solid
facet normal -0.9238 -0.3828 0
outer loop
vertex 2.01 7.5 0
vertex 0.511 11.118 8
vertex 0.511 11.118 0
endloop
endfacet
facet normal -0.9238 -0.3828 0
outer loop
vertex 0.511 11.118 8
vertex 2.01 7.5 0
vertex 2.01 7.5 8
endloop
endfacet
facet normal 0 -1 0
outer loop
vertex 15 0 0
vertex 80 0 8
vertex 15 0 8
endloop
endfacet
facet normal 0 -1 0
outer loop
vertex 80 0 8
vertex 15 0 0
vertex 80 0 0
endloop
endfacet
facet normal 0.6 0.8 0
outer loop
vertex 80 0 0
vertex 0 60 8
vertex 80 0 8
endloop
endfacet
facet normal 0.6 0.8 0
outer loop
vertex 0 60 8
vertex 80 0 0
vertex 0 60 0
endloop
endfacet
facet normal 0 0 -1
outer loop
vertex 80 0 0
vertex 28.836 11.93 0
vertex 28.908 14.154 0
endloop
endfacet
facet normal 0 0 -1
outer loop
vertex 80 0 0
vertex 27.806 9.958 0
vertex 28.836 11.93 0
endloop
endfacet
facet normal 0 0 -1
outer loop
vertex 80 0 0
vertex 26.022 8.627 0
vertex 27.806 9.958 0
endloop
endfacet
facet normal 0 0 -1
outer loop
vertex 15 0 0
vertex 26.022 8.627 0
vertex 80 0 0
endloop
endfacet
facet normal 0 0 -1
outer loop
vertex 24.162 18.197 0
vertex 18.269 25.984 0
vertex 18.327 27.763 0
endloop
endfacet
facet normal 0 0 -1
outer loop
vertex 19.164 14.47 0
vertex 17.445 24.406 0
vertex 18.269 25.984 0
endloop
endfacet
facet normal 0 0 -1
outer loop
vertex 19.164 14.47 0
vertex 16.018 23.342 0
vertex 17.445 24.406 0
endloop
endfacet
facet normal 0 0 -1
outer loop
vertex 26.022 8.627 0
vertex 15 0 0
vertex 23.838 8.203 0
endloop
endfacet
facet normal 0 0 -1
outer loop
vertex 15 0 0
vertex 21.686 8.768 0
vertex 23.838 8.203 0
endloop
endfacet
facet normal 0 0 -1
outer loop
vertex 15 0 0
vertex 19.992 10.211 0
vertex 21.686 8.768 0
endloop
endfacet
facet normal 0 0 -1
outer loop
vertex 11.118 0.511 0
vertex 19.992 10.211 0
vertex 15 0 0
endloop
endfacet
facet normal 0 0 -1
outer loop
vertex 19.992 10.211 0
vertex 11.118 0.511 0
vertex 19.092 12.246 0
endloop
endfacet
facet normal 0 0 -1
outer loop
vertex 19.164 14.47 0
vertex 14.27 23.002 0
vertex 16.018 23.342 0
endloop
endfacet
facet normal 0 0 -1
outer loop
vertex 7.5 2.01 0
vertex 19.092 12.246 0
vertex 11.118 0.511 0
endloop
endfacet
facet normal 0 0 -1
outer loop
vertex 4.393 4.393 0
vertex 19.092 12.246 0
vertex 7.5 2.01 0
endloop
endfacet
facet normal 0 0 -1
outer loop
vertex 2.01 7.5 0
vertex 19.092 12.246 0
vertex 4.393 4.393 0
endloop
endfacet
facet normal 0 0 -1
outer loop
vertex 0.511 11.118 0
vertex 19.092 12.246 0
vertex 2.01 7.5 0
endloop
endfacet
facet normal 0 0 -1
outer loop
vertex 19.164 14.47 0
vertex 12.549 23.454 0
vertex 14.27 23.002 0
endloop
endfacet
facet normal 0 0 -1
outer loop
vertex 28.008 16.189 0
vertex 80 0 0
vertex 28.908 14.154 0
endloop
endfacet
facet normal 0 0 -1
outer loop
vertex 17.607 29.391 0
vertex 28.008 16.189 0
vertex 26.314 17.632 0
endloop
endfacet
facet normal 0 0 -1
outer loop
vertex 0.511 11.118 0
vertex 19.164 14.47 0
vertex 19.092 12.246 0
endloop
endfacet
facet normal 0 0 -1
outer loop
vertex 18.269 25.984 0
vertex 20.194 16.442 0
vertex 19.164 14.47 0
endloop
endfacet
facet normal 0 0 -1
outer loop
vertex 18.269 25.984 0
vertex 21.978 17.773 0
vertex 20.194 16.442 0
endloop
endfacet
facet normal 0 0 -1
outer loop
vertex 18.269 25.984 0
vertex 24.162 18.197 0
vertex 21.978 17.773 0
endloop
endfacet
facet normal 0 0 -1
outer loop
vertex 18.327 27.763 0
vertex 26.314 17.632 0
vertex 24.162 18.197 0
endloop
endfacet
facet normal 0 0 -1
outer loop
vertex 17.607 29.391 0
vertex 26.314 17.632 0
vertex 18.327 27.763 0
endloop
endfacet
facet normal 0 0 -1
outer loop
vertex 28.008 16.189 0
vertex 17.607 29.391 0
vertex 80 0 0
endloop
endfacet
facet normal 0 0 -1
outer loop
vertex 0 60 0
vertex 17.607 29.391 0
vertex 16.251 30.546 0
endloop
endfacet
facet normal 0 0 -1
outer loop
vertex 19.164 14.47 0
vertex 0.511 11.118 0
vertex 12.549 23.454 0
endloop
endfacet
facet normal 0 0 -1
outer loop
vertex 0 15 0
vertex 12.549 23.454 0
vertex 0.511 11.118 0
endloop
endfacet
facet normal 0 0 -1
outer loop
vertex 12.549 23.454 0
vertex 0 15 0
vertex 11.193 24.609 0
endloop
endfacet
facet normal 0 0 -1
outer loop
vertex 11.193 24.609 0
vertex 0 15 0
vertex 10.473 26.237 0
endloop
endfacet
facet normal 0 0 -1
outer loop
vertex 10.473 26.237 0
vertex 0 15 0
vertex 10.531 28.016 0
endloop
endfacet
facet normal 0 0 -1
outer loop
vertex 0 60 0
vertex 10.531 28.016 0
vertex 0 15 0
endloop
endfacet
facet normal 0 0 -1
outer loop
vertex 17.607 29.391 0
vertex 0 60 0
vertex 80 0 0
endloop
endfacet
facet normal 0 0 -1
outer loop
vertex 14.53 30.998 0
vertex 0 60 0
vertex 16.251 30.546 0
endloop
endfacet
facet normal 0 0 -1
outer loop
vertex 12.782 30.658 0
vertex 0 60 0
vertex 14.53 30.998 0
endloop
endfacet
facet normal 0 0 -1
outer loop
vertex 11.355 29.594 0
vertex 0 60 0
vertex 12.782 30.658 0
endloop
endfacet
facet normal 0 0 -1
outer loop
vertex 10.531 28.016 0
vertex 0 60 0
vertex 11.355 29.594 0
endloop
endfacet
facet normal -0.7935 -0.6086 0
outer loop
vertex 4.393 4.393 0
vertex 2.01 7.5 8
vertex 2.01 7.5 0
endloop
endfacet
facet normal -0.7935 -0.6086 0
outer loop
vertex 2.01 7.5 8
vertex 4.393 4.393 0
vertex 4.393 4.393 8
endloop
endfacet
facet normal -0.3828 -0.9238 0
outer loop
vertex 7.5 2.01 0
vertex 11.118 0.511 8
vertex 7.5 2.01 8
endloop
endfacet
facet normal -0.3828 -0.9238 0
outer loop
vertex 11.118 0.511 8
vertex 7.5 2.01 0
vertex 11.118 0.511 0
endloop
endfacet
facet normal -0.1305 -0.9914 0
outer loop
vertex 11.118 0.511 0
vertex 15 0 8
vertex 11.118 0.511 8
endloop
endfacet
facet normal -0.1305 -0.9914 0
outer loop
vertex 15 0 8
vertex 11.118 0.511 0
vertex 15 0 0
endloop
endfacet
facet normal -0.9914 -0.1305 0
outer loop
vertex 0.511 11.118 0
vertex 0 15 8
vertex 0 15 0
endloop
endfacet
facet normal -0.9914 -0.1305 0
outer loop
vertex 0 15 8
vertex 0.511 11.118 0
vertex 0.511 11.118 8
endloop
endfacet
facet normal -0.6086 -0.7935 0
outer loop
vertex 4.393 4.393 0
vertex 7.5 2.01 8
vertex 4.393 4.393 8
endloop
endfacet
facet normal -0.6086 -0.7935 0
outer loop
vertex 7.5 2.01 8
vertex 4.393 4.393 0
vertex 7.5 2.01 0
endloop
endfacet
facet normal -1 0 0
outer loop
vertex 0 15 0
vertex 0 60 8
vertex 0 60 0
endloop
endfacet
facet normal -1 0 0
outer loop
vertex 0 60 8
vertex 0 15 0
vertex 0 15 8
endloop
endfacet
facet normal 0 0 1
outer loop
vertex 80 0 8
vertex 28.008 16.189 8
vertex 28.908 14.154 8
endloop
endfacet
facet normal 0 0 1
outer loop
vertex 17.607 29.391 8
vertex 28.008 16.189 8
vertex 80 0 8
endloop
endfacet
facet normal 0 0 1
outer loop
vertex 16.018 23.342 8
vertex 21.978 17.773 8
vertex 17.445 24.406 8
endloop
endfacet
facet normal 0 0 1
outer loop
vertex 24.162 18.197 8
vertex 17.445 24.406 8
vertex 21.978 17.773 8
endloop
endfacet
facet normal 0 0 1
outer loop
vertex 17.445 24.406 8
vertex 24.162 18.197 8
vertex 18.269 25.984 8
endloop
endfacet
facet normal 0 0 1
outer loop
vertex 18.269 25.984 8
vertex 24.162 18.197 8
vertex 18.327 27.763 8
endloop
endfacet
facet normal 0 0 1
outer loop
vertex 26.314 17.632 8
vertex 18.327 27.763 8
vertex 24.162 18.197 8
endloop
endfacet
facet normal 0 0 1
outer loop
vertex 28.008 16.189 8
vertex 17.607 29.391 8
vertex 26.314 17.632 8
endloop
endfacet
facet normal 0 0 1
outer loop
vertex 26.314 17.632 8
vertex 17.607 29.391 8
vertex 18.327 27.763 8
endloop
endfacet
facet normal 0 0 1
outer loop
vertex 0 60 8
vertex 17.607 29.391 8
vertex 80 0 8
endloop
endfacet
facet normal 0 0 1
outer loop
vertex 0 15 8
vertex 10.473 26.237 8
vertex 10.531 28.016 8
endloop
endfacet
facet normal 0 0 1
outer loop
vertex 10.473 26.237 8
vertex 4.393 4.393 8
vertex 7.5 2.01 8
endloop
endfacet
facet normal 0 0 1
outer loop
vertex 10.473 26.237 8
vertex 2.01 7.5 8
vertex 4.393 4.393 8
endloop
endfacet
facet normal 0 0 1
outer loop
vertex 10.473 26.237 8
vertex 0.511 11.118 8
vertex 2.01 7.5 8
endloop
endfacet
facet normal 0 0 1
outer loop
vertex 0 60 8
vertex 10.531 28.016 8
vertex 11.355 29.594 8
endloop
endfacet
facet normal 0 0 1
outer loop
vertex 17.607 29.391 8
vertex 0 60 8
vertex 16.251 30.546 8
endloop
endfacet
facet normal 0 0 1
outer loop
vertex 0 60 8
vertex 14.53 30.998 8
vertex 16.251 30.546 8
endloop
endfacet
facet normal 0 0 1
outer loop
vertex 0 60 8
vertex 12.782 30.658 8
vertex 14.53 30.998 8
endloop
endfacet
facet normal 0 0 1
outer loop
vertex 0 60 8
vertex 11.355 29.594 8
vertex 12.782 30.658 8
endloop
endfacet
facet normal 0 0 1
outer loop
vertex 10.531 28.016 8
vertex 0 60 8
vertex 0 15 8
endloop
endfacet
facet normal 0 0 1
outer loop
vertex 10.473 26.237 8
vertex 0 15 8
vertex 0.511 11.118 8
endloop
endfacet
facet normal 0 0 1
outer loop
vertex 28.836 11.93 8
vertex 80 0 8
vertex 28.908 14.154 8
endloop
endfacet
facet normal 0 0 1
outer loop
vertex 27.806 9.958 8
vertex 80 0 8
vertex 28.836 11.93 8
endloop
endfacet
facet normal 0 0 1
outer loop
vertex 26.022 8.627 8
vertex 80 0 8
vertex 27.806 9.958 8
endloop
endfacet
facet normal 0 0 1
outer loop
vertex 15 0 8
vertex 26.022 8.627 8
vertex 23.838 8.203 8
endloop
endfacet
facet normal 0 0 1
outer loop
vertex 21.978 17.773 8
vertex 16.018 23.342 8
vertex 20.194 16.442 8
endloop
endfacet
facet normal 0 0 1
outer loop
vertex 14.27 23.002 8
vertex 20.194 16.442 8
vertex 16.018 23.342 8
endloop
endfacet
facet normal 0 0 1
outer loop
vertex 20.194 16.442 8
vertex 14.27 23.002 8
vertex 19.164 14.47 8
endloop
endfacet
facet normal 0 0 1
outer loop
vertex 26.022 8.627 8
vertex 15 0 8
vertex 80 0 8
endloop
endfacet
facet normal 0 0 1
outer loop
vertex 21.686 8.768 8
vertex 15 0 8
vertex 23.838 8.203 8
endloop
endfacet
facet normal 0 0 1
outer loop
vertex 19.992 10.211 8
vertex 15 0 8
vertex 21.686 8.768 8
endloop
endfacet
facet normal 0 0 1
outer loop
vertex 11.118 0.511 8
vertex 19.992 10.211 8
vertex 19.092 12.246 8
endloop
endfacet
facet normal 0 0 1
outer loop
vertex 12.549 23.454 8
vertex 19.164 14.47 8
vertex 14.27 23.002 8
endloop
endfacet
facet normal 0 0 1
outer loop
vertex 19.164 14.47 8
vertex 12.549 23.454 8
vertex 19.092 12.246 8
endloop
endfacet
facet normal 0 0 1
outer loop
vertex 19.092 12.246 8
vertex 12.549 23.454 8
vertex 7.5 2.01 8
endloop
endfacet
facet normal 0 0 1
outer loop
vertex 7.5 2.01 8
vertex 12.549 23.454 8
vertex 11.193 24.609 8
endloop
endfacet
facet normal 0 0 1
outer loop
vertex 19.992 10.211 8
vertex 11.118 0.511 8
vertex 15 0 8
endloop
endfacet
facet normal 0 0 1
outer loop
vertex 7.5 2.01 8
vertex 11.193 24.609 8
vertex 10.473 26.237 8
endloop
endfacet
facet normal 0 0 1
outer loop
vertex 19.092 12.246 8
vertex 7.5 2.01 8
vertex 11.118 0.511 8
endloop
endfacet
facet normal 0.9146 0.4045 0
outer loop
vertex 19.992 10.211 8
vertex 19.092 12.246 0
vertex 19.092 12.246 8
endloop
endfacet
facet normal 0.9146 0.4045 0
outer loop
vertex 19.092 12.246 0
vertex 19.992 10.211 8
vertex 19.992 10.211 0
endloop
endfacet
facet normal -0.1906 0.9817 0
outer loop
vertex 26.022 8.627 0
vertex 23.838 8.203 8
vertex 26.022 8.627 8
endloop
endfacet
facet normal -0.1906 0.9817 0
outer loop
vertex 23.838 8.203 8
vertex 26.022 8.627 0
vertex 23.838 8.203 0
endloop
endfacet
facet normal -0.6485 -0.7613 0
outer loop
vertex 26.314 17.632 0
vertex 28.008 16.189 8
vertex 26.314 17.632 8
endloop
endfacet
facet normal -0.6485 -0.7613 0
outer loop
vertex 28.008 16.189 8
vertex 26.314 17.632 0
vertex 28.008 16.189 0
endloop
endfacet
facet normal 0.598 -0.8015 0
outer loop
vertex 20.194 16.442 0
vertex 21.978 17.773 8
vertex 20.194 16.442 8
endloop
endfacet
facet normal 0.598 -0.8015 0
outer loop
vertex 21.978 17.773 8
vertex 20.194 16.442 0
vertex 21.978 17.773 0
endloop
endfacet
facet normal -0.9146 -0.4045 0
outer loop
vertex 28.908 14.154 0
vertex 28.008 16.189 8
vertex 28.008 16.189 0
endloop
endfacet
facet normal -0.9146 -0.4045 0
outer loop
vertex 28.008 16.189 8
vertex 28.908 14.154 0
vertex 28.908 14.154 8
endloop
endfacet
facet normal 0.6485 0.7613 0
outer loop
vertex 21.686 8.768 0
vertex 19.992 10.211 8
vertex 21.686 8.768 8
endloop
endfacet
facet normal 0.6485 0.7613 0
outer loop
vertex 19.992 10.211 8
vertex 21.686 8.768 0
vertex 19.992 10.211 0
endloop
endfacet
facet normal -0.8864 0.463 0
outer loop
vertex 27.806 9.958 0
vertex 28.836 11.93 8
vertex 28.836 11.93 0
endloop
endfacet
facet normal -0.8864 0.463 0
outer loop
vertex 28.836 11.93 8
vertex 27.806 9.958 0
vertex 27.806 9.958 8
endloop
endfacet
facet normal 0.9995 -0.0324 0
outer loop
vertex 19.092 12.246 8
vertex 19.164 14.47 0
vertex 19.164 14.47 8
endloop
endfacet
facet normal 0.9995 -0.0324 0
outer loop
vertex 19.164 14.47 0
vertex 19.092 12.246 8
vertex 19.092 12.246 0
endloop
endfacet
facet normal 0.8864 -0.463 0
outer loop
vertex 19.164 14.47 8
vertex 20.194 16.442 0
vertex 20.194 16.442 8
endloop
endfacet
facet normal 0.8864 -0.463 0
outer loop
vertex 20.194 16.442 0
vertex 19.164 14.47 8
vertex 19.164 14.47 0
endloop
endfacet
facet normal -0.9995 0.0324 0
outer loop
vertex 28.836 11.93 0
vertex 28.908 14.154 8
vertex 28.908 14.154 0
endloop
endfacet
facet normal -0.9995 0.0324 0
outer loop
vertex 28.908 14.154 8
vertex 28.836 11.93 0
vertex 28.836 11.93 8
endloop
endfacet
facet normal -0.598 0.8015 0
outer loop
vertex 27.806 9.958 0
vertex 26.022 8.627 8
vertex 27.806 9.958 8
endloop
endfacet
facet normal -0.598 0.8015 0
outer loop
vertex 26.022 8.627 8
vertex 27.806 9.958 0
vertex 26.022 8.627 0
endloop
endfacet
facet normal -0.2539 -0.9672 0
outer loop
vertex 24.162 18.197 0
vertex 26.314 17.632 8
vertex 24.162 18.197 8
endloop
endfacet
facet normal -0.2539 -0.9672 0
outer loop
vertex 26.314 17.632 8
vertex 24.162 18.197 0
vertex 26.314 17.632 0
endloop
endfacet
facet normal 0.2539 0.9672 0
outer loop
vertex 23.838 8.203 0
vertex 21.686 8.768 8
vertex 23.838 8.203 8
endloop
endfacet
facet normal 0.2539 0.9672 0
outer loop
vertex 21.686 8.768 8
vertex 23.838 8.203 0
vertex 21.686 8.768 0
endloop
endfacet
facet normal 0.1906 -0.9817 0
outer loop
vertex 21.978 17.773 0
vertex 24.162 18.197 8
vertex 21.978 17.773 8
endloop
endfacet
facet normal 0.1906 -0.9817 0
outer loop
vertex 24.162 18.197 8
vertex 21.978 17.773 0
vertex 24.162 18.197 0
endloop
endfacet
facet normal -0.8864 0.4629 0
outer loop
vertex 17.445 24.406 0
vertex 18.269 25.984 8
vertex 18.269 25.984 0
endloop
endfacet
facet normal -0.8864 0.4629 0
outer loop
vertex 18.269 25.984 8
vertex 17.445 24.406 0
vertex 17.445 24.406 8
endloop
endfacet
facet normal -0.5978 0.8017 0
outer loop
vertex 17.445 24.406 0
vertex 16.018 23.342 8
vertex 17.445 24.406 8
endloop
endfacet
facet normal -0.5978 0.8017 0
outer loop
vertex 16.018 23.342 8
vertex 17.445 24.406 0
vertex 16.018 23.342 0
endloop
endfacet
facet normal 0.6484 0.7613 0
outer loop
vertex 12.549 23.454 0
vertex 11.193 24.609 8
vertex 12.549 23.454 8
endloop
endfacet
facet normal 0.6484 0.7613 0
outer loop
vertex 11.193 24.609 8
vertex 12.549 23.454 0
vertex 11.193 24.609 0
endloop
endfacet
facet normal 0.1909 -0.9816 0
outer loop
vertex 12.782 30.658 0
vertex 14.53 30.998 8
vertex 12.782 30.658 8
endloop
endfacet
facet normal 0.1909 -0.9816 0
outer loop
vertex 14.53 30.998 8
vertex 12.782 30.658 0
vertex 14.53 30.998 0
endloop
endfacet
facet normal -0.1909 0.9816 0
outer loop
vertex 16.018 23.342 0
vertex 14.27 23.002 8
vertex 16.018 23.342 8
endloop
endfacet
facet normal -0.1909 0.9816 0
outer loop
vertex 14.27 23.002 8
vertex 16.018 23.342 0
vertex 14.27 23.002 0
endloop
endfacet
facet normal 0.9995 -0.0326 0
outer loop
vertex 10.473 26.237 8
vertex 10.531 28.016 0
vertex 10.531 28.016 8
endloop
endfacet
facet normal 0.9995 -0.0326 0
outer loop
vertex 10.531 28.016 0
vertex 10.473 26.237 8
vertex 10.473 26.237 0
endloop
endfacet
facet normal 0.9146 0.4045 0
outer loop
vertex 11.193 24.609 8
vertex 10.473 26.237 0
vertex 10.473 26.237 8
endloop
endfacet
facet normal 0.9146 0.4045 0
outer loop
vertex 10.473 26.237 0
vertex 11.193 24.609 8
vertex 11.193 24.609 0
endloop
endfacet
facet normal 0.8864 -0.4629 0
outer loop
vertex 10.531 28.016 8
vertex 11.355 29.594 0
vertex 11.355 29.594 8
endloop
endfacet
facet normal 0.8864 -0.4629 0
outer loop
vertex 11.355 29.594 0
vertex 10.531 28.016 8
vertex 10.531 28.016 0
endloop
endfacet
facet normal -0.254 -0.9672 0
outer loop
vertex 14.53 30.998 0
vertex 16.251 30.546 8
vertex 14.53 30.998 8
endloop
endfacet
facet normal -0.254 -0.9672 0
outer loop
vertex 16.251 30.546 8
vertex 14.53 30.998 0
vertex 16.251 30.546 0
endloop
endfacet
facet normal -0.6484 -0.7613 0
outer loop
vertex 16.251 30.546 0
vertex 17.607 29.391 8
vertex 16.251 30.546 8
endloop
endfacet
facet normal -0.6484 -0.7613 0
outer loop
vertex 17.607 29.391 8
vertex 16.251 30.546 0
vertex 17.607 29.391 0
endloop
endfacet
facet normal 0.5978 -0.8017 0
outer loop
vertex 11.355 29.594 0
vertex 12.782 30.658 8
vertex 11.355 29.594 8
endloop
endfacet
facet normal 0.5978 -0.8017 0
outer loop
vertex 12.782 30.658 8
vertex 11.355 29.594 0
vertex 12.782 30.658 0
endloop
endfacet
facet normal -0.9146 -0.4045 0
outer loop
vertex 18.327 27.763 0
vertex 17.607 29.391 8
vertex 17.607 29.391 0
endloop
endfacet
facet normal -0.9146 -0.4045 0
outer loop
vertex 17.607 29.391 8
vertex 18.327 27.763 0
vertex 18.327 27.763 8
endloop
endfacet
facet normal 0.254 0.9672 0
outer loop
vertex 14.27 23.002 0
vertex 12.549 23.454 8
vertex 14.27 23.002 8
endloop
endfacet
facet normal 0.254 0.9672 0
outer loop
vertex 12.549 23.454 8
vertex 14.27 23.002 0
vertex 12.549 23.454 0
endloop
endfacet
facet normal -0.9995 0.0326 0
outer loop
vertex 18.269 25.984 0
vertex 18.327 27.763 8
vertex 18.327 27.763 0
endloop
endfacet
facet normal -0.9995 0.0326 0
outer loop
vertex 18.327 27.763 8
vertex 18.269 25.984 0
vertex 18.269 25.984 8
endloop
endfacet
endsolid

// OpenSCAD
$fn = 32;

// ----------------------------------------------------------------------
// Bracket plate: corner pad 80 x 60, fillet R15
// ----------------------------------------------------------------------

// --- parameters (mm) ---
hole_r = 4;               // bolt hole radius
plate_t = 8;              // plate thickness, Z (extrusion height)
leg_a = 80;               // base leg
leg_b = 60;               // height leg
fillet_r = 15;            // right-angle fillet radius
fit_tol = 0.05;           // declared fit tolerance (prompt contract)
free_tol = 0.2;           // declared free tolerance (prompt contract)

hole_d1 = 2 * hole_r + 2;
hole_d2 = 2 * hole_r;

profile = [[15, 0], [80, 0], [0, 60], [0, 15], [0.511, 11.118], [2.01, 7.5], [4.393, 4.393], [7.5, 2.01], [11.118, 0.511]];  // primary outline, 9 points, counter clockwise
void_1 = [[28.908, 14.154], [28.008, 16.189], [26.314, 17.632], [24.162, 18.197], [21.978, 17.773], [20.194, 16.442], [19.164, 14.47], [19.092, 12.246], [19.992, 10.211], [21.686, 8.768], [23.838, 8.203], [26.022, 8.627], [27.806, 9.958], [28.836, 11.93]];  // mount hole 1, 14 points
void_2 = [[18.327, 27.763], [17.607, 29.391], [16.251, 30.546], [14.53, 30.998], [12.782, 30.658], [11.355, 29.594], [10.531, 28.016], [10.473, 26.237], [11.193, 24.609], [12.549, 23.454], [14.27, 23.002], [16.018, 23.342], [17.445, 24.406], [18.269, 25.984]];  // mount hole 2, 14 points

// --- the one profile operation ---
difference() {
  linear_extrude(height = plate_t) polygon(points = profile);
  translate([0, 0, -1])
    linear_extrude(height = plate_t + 2) polygon(points = void_1);
  translate([0, 0, -1])
    linear_extrude(height = plate_t + 2) polygon(points = void_2);
}
